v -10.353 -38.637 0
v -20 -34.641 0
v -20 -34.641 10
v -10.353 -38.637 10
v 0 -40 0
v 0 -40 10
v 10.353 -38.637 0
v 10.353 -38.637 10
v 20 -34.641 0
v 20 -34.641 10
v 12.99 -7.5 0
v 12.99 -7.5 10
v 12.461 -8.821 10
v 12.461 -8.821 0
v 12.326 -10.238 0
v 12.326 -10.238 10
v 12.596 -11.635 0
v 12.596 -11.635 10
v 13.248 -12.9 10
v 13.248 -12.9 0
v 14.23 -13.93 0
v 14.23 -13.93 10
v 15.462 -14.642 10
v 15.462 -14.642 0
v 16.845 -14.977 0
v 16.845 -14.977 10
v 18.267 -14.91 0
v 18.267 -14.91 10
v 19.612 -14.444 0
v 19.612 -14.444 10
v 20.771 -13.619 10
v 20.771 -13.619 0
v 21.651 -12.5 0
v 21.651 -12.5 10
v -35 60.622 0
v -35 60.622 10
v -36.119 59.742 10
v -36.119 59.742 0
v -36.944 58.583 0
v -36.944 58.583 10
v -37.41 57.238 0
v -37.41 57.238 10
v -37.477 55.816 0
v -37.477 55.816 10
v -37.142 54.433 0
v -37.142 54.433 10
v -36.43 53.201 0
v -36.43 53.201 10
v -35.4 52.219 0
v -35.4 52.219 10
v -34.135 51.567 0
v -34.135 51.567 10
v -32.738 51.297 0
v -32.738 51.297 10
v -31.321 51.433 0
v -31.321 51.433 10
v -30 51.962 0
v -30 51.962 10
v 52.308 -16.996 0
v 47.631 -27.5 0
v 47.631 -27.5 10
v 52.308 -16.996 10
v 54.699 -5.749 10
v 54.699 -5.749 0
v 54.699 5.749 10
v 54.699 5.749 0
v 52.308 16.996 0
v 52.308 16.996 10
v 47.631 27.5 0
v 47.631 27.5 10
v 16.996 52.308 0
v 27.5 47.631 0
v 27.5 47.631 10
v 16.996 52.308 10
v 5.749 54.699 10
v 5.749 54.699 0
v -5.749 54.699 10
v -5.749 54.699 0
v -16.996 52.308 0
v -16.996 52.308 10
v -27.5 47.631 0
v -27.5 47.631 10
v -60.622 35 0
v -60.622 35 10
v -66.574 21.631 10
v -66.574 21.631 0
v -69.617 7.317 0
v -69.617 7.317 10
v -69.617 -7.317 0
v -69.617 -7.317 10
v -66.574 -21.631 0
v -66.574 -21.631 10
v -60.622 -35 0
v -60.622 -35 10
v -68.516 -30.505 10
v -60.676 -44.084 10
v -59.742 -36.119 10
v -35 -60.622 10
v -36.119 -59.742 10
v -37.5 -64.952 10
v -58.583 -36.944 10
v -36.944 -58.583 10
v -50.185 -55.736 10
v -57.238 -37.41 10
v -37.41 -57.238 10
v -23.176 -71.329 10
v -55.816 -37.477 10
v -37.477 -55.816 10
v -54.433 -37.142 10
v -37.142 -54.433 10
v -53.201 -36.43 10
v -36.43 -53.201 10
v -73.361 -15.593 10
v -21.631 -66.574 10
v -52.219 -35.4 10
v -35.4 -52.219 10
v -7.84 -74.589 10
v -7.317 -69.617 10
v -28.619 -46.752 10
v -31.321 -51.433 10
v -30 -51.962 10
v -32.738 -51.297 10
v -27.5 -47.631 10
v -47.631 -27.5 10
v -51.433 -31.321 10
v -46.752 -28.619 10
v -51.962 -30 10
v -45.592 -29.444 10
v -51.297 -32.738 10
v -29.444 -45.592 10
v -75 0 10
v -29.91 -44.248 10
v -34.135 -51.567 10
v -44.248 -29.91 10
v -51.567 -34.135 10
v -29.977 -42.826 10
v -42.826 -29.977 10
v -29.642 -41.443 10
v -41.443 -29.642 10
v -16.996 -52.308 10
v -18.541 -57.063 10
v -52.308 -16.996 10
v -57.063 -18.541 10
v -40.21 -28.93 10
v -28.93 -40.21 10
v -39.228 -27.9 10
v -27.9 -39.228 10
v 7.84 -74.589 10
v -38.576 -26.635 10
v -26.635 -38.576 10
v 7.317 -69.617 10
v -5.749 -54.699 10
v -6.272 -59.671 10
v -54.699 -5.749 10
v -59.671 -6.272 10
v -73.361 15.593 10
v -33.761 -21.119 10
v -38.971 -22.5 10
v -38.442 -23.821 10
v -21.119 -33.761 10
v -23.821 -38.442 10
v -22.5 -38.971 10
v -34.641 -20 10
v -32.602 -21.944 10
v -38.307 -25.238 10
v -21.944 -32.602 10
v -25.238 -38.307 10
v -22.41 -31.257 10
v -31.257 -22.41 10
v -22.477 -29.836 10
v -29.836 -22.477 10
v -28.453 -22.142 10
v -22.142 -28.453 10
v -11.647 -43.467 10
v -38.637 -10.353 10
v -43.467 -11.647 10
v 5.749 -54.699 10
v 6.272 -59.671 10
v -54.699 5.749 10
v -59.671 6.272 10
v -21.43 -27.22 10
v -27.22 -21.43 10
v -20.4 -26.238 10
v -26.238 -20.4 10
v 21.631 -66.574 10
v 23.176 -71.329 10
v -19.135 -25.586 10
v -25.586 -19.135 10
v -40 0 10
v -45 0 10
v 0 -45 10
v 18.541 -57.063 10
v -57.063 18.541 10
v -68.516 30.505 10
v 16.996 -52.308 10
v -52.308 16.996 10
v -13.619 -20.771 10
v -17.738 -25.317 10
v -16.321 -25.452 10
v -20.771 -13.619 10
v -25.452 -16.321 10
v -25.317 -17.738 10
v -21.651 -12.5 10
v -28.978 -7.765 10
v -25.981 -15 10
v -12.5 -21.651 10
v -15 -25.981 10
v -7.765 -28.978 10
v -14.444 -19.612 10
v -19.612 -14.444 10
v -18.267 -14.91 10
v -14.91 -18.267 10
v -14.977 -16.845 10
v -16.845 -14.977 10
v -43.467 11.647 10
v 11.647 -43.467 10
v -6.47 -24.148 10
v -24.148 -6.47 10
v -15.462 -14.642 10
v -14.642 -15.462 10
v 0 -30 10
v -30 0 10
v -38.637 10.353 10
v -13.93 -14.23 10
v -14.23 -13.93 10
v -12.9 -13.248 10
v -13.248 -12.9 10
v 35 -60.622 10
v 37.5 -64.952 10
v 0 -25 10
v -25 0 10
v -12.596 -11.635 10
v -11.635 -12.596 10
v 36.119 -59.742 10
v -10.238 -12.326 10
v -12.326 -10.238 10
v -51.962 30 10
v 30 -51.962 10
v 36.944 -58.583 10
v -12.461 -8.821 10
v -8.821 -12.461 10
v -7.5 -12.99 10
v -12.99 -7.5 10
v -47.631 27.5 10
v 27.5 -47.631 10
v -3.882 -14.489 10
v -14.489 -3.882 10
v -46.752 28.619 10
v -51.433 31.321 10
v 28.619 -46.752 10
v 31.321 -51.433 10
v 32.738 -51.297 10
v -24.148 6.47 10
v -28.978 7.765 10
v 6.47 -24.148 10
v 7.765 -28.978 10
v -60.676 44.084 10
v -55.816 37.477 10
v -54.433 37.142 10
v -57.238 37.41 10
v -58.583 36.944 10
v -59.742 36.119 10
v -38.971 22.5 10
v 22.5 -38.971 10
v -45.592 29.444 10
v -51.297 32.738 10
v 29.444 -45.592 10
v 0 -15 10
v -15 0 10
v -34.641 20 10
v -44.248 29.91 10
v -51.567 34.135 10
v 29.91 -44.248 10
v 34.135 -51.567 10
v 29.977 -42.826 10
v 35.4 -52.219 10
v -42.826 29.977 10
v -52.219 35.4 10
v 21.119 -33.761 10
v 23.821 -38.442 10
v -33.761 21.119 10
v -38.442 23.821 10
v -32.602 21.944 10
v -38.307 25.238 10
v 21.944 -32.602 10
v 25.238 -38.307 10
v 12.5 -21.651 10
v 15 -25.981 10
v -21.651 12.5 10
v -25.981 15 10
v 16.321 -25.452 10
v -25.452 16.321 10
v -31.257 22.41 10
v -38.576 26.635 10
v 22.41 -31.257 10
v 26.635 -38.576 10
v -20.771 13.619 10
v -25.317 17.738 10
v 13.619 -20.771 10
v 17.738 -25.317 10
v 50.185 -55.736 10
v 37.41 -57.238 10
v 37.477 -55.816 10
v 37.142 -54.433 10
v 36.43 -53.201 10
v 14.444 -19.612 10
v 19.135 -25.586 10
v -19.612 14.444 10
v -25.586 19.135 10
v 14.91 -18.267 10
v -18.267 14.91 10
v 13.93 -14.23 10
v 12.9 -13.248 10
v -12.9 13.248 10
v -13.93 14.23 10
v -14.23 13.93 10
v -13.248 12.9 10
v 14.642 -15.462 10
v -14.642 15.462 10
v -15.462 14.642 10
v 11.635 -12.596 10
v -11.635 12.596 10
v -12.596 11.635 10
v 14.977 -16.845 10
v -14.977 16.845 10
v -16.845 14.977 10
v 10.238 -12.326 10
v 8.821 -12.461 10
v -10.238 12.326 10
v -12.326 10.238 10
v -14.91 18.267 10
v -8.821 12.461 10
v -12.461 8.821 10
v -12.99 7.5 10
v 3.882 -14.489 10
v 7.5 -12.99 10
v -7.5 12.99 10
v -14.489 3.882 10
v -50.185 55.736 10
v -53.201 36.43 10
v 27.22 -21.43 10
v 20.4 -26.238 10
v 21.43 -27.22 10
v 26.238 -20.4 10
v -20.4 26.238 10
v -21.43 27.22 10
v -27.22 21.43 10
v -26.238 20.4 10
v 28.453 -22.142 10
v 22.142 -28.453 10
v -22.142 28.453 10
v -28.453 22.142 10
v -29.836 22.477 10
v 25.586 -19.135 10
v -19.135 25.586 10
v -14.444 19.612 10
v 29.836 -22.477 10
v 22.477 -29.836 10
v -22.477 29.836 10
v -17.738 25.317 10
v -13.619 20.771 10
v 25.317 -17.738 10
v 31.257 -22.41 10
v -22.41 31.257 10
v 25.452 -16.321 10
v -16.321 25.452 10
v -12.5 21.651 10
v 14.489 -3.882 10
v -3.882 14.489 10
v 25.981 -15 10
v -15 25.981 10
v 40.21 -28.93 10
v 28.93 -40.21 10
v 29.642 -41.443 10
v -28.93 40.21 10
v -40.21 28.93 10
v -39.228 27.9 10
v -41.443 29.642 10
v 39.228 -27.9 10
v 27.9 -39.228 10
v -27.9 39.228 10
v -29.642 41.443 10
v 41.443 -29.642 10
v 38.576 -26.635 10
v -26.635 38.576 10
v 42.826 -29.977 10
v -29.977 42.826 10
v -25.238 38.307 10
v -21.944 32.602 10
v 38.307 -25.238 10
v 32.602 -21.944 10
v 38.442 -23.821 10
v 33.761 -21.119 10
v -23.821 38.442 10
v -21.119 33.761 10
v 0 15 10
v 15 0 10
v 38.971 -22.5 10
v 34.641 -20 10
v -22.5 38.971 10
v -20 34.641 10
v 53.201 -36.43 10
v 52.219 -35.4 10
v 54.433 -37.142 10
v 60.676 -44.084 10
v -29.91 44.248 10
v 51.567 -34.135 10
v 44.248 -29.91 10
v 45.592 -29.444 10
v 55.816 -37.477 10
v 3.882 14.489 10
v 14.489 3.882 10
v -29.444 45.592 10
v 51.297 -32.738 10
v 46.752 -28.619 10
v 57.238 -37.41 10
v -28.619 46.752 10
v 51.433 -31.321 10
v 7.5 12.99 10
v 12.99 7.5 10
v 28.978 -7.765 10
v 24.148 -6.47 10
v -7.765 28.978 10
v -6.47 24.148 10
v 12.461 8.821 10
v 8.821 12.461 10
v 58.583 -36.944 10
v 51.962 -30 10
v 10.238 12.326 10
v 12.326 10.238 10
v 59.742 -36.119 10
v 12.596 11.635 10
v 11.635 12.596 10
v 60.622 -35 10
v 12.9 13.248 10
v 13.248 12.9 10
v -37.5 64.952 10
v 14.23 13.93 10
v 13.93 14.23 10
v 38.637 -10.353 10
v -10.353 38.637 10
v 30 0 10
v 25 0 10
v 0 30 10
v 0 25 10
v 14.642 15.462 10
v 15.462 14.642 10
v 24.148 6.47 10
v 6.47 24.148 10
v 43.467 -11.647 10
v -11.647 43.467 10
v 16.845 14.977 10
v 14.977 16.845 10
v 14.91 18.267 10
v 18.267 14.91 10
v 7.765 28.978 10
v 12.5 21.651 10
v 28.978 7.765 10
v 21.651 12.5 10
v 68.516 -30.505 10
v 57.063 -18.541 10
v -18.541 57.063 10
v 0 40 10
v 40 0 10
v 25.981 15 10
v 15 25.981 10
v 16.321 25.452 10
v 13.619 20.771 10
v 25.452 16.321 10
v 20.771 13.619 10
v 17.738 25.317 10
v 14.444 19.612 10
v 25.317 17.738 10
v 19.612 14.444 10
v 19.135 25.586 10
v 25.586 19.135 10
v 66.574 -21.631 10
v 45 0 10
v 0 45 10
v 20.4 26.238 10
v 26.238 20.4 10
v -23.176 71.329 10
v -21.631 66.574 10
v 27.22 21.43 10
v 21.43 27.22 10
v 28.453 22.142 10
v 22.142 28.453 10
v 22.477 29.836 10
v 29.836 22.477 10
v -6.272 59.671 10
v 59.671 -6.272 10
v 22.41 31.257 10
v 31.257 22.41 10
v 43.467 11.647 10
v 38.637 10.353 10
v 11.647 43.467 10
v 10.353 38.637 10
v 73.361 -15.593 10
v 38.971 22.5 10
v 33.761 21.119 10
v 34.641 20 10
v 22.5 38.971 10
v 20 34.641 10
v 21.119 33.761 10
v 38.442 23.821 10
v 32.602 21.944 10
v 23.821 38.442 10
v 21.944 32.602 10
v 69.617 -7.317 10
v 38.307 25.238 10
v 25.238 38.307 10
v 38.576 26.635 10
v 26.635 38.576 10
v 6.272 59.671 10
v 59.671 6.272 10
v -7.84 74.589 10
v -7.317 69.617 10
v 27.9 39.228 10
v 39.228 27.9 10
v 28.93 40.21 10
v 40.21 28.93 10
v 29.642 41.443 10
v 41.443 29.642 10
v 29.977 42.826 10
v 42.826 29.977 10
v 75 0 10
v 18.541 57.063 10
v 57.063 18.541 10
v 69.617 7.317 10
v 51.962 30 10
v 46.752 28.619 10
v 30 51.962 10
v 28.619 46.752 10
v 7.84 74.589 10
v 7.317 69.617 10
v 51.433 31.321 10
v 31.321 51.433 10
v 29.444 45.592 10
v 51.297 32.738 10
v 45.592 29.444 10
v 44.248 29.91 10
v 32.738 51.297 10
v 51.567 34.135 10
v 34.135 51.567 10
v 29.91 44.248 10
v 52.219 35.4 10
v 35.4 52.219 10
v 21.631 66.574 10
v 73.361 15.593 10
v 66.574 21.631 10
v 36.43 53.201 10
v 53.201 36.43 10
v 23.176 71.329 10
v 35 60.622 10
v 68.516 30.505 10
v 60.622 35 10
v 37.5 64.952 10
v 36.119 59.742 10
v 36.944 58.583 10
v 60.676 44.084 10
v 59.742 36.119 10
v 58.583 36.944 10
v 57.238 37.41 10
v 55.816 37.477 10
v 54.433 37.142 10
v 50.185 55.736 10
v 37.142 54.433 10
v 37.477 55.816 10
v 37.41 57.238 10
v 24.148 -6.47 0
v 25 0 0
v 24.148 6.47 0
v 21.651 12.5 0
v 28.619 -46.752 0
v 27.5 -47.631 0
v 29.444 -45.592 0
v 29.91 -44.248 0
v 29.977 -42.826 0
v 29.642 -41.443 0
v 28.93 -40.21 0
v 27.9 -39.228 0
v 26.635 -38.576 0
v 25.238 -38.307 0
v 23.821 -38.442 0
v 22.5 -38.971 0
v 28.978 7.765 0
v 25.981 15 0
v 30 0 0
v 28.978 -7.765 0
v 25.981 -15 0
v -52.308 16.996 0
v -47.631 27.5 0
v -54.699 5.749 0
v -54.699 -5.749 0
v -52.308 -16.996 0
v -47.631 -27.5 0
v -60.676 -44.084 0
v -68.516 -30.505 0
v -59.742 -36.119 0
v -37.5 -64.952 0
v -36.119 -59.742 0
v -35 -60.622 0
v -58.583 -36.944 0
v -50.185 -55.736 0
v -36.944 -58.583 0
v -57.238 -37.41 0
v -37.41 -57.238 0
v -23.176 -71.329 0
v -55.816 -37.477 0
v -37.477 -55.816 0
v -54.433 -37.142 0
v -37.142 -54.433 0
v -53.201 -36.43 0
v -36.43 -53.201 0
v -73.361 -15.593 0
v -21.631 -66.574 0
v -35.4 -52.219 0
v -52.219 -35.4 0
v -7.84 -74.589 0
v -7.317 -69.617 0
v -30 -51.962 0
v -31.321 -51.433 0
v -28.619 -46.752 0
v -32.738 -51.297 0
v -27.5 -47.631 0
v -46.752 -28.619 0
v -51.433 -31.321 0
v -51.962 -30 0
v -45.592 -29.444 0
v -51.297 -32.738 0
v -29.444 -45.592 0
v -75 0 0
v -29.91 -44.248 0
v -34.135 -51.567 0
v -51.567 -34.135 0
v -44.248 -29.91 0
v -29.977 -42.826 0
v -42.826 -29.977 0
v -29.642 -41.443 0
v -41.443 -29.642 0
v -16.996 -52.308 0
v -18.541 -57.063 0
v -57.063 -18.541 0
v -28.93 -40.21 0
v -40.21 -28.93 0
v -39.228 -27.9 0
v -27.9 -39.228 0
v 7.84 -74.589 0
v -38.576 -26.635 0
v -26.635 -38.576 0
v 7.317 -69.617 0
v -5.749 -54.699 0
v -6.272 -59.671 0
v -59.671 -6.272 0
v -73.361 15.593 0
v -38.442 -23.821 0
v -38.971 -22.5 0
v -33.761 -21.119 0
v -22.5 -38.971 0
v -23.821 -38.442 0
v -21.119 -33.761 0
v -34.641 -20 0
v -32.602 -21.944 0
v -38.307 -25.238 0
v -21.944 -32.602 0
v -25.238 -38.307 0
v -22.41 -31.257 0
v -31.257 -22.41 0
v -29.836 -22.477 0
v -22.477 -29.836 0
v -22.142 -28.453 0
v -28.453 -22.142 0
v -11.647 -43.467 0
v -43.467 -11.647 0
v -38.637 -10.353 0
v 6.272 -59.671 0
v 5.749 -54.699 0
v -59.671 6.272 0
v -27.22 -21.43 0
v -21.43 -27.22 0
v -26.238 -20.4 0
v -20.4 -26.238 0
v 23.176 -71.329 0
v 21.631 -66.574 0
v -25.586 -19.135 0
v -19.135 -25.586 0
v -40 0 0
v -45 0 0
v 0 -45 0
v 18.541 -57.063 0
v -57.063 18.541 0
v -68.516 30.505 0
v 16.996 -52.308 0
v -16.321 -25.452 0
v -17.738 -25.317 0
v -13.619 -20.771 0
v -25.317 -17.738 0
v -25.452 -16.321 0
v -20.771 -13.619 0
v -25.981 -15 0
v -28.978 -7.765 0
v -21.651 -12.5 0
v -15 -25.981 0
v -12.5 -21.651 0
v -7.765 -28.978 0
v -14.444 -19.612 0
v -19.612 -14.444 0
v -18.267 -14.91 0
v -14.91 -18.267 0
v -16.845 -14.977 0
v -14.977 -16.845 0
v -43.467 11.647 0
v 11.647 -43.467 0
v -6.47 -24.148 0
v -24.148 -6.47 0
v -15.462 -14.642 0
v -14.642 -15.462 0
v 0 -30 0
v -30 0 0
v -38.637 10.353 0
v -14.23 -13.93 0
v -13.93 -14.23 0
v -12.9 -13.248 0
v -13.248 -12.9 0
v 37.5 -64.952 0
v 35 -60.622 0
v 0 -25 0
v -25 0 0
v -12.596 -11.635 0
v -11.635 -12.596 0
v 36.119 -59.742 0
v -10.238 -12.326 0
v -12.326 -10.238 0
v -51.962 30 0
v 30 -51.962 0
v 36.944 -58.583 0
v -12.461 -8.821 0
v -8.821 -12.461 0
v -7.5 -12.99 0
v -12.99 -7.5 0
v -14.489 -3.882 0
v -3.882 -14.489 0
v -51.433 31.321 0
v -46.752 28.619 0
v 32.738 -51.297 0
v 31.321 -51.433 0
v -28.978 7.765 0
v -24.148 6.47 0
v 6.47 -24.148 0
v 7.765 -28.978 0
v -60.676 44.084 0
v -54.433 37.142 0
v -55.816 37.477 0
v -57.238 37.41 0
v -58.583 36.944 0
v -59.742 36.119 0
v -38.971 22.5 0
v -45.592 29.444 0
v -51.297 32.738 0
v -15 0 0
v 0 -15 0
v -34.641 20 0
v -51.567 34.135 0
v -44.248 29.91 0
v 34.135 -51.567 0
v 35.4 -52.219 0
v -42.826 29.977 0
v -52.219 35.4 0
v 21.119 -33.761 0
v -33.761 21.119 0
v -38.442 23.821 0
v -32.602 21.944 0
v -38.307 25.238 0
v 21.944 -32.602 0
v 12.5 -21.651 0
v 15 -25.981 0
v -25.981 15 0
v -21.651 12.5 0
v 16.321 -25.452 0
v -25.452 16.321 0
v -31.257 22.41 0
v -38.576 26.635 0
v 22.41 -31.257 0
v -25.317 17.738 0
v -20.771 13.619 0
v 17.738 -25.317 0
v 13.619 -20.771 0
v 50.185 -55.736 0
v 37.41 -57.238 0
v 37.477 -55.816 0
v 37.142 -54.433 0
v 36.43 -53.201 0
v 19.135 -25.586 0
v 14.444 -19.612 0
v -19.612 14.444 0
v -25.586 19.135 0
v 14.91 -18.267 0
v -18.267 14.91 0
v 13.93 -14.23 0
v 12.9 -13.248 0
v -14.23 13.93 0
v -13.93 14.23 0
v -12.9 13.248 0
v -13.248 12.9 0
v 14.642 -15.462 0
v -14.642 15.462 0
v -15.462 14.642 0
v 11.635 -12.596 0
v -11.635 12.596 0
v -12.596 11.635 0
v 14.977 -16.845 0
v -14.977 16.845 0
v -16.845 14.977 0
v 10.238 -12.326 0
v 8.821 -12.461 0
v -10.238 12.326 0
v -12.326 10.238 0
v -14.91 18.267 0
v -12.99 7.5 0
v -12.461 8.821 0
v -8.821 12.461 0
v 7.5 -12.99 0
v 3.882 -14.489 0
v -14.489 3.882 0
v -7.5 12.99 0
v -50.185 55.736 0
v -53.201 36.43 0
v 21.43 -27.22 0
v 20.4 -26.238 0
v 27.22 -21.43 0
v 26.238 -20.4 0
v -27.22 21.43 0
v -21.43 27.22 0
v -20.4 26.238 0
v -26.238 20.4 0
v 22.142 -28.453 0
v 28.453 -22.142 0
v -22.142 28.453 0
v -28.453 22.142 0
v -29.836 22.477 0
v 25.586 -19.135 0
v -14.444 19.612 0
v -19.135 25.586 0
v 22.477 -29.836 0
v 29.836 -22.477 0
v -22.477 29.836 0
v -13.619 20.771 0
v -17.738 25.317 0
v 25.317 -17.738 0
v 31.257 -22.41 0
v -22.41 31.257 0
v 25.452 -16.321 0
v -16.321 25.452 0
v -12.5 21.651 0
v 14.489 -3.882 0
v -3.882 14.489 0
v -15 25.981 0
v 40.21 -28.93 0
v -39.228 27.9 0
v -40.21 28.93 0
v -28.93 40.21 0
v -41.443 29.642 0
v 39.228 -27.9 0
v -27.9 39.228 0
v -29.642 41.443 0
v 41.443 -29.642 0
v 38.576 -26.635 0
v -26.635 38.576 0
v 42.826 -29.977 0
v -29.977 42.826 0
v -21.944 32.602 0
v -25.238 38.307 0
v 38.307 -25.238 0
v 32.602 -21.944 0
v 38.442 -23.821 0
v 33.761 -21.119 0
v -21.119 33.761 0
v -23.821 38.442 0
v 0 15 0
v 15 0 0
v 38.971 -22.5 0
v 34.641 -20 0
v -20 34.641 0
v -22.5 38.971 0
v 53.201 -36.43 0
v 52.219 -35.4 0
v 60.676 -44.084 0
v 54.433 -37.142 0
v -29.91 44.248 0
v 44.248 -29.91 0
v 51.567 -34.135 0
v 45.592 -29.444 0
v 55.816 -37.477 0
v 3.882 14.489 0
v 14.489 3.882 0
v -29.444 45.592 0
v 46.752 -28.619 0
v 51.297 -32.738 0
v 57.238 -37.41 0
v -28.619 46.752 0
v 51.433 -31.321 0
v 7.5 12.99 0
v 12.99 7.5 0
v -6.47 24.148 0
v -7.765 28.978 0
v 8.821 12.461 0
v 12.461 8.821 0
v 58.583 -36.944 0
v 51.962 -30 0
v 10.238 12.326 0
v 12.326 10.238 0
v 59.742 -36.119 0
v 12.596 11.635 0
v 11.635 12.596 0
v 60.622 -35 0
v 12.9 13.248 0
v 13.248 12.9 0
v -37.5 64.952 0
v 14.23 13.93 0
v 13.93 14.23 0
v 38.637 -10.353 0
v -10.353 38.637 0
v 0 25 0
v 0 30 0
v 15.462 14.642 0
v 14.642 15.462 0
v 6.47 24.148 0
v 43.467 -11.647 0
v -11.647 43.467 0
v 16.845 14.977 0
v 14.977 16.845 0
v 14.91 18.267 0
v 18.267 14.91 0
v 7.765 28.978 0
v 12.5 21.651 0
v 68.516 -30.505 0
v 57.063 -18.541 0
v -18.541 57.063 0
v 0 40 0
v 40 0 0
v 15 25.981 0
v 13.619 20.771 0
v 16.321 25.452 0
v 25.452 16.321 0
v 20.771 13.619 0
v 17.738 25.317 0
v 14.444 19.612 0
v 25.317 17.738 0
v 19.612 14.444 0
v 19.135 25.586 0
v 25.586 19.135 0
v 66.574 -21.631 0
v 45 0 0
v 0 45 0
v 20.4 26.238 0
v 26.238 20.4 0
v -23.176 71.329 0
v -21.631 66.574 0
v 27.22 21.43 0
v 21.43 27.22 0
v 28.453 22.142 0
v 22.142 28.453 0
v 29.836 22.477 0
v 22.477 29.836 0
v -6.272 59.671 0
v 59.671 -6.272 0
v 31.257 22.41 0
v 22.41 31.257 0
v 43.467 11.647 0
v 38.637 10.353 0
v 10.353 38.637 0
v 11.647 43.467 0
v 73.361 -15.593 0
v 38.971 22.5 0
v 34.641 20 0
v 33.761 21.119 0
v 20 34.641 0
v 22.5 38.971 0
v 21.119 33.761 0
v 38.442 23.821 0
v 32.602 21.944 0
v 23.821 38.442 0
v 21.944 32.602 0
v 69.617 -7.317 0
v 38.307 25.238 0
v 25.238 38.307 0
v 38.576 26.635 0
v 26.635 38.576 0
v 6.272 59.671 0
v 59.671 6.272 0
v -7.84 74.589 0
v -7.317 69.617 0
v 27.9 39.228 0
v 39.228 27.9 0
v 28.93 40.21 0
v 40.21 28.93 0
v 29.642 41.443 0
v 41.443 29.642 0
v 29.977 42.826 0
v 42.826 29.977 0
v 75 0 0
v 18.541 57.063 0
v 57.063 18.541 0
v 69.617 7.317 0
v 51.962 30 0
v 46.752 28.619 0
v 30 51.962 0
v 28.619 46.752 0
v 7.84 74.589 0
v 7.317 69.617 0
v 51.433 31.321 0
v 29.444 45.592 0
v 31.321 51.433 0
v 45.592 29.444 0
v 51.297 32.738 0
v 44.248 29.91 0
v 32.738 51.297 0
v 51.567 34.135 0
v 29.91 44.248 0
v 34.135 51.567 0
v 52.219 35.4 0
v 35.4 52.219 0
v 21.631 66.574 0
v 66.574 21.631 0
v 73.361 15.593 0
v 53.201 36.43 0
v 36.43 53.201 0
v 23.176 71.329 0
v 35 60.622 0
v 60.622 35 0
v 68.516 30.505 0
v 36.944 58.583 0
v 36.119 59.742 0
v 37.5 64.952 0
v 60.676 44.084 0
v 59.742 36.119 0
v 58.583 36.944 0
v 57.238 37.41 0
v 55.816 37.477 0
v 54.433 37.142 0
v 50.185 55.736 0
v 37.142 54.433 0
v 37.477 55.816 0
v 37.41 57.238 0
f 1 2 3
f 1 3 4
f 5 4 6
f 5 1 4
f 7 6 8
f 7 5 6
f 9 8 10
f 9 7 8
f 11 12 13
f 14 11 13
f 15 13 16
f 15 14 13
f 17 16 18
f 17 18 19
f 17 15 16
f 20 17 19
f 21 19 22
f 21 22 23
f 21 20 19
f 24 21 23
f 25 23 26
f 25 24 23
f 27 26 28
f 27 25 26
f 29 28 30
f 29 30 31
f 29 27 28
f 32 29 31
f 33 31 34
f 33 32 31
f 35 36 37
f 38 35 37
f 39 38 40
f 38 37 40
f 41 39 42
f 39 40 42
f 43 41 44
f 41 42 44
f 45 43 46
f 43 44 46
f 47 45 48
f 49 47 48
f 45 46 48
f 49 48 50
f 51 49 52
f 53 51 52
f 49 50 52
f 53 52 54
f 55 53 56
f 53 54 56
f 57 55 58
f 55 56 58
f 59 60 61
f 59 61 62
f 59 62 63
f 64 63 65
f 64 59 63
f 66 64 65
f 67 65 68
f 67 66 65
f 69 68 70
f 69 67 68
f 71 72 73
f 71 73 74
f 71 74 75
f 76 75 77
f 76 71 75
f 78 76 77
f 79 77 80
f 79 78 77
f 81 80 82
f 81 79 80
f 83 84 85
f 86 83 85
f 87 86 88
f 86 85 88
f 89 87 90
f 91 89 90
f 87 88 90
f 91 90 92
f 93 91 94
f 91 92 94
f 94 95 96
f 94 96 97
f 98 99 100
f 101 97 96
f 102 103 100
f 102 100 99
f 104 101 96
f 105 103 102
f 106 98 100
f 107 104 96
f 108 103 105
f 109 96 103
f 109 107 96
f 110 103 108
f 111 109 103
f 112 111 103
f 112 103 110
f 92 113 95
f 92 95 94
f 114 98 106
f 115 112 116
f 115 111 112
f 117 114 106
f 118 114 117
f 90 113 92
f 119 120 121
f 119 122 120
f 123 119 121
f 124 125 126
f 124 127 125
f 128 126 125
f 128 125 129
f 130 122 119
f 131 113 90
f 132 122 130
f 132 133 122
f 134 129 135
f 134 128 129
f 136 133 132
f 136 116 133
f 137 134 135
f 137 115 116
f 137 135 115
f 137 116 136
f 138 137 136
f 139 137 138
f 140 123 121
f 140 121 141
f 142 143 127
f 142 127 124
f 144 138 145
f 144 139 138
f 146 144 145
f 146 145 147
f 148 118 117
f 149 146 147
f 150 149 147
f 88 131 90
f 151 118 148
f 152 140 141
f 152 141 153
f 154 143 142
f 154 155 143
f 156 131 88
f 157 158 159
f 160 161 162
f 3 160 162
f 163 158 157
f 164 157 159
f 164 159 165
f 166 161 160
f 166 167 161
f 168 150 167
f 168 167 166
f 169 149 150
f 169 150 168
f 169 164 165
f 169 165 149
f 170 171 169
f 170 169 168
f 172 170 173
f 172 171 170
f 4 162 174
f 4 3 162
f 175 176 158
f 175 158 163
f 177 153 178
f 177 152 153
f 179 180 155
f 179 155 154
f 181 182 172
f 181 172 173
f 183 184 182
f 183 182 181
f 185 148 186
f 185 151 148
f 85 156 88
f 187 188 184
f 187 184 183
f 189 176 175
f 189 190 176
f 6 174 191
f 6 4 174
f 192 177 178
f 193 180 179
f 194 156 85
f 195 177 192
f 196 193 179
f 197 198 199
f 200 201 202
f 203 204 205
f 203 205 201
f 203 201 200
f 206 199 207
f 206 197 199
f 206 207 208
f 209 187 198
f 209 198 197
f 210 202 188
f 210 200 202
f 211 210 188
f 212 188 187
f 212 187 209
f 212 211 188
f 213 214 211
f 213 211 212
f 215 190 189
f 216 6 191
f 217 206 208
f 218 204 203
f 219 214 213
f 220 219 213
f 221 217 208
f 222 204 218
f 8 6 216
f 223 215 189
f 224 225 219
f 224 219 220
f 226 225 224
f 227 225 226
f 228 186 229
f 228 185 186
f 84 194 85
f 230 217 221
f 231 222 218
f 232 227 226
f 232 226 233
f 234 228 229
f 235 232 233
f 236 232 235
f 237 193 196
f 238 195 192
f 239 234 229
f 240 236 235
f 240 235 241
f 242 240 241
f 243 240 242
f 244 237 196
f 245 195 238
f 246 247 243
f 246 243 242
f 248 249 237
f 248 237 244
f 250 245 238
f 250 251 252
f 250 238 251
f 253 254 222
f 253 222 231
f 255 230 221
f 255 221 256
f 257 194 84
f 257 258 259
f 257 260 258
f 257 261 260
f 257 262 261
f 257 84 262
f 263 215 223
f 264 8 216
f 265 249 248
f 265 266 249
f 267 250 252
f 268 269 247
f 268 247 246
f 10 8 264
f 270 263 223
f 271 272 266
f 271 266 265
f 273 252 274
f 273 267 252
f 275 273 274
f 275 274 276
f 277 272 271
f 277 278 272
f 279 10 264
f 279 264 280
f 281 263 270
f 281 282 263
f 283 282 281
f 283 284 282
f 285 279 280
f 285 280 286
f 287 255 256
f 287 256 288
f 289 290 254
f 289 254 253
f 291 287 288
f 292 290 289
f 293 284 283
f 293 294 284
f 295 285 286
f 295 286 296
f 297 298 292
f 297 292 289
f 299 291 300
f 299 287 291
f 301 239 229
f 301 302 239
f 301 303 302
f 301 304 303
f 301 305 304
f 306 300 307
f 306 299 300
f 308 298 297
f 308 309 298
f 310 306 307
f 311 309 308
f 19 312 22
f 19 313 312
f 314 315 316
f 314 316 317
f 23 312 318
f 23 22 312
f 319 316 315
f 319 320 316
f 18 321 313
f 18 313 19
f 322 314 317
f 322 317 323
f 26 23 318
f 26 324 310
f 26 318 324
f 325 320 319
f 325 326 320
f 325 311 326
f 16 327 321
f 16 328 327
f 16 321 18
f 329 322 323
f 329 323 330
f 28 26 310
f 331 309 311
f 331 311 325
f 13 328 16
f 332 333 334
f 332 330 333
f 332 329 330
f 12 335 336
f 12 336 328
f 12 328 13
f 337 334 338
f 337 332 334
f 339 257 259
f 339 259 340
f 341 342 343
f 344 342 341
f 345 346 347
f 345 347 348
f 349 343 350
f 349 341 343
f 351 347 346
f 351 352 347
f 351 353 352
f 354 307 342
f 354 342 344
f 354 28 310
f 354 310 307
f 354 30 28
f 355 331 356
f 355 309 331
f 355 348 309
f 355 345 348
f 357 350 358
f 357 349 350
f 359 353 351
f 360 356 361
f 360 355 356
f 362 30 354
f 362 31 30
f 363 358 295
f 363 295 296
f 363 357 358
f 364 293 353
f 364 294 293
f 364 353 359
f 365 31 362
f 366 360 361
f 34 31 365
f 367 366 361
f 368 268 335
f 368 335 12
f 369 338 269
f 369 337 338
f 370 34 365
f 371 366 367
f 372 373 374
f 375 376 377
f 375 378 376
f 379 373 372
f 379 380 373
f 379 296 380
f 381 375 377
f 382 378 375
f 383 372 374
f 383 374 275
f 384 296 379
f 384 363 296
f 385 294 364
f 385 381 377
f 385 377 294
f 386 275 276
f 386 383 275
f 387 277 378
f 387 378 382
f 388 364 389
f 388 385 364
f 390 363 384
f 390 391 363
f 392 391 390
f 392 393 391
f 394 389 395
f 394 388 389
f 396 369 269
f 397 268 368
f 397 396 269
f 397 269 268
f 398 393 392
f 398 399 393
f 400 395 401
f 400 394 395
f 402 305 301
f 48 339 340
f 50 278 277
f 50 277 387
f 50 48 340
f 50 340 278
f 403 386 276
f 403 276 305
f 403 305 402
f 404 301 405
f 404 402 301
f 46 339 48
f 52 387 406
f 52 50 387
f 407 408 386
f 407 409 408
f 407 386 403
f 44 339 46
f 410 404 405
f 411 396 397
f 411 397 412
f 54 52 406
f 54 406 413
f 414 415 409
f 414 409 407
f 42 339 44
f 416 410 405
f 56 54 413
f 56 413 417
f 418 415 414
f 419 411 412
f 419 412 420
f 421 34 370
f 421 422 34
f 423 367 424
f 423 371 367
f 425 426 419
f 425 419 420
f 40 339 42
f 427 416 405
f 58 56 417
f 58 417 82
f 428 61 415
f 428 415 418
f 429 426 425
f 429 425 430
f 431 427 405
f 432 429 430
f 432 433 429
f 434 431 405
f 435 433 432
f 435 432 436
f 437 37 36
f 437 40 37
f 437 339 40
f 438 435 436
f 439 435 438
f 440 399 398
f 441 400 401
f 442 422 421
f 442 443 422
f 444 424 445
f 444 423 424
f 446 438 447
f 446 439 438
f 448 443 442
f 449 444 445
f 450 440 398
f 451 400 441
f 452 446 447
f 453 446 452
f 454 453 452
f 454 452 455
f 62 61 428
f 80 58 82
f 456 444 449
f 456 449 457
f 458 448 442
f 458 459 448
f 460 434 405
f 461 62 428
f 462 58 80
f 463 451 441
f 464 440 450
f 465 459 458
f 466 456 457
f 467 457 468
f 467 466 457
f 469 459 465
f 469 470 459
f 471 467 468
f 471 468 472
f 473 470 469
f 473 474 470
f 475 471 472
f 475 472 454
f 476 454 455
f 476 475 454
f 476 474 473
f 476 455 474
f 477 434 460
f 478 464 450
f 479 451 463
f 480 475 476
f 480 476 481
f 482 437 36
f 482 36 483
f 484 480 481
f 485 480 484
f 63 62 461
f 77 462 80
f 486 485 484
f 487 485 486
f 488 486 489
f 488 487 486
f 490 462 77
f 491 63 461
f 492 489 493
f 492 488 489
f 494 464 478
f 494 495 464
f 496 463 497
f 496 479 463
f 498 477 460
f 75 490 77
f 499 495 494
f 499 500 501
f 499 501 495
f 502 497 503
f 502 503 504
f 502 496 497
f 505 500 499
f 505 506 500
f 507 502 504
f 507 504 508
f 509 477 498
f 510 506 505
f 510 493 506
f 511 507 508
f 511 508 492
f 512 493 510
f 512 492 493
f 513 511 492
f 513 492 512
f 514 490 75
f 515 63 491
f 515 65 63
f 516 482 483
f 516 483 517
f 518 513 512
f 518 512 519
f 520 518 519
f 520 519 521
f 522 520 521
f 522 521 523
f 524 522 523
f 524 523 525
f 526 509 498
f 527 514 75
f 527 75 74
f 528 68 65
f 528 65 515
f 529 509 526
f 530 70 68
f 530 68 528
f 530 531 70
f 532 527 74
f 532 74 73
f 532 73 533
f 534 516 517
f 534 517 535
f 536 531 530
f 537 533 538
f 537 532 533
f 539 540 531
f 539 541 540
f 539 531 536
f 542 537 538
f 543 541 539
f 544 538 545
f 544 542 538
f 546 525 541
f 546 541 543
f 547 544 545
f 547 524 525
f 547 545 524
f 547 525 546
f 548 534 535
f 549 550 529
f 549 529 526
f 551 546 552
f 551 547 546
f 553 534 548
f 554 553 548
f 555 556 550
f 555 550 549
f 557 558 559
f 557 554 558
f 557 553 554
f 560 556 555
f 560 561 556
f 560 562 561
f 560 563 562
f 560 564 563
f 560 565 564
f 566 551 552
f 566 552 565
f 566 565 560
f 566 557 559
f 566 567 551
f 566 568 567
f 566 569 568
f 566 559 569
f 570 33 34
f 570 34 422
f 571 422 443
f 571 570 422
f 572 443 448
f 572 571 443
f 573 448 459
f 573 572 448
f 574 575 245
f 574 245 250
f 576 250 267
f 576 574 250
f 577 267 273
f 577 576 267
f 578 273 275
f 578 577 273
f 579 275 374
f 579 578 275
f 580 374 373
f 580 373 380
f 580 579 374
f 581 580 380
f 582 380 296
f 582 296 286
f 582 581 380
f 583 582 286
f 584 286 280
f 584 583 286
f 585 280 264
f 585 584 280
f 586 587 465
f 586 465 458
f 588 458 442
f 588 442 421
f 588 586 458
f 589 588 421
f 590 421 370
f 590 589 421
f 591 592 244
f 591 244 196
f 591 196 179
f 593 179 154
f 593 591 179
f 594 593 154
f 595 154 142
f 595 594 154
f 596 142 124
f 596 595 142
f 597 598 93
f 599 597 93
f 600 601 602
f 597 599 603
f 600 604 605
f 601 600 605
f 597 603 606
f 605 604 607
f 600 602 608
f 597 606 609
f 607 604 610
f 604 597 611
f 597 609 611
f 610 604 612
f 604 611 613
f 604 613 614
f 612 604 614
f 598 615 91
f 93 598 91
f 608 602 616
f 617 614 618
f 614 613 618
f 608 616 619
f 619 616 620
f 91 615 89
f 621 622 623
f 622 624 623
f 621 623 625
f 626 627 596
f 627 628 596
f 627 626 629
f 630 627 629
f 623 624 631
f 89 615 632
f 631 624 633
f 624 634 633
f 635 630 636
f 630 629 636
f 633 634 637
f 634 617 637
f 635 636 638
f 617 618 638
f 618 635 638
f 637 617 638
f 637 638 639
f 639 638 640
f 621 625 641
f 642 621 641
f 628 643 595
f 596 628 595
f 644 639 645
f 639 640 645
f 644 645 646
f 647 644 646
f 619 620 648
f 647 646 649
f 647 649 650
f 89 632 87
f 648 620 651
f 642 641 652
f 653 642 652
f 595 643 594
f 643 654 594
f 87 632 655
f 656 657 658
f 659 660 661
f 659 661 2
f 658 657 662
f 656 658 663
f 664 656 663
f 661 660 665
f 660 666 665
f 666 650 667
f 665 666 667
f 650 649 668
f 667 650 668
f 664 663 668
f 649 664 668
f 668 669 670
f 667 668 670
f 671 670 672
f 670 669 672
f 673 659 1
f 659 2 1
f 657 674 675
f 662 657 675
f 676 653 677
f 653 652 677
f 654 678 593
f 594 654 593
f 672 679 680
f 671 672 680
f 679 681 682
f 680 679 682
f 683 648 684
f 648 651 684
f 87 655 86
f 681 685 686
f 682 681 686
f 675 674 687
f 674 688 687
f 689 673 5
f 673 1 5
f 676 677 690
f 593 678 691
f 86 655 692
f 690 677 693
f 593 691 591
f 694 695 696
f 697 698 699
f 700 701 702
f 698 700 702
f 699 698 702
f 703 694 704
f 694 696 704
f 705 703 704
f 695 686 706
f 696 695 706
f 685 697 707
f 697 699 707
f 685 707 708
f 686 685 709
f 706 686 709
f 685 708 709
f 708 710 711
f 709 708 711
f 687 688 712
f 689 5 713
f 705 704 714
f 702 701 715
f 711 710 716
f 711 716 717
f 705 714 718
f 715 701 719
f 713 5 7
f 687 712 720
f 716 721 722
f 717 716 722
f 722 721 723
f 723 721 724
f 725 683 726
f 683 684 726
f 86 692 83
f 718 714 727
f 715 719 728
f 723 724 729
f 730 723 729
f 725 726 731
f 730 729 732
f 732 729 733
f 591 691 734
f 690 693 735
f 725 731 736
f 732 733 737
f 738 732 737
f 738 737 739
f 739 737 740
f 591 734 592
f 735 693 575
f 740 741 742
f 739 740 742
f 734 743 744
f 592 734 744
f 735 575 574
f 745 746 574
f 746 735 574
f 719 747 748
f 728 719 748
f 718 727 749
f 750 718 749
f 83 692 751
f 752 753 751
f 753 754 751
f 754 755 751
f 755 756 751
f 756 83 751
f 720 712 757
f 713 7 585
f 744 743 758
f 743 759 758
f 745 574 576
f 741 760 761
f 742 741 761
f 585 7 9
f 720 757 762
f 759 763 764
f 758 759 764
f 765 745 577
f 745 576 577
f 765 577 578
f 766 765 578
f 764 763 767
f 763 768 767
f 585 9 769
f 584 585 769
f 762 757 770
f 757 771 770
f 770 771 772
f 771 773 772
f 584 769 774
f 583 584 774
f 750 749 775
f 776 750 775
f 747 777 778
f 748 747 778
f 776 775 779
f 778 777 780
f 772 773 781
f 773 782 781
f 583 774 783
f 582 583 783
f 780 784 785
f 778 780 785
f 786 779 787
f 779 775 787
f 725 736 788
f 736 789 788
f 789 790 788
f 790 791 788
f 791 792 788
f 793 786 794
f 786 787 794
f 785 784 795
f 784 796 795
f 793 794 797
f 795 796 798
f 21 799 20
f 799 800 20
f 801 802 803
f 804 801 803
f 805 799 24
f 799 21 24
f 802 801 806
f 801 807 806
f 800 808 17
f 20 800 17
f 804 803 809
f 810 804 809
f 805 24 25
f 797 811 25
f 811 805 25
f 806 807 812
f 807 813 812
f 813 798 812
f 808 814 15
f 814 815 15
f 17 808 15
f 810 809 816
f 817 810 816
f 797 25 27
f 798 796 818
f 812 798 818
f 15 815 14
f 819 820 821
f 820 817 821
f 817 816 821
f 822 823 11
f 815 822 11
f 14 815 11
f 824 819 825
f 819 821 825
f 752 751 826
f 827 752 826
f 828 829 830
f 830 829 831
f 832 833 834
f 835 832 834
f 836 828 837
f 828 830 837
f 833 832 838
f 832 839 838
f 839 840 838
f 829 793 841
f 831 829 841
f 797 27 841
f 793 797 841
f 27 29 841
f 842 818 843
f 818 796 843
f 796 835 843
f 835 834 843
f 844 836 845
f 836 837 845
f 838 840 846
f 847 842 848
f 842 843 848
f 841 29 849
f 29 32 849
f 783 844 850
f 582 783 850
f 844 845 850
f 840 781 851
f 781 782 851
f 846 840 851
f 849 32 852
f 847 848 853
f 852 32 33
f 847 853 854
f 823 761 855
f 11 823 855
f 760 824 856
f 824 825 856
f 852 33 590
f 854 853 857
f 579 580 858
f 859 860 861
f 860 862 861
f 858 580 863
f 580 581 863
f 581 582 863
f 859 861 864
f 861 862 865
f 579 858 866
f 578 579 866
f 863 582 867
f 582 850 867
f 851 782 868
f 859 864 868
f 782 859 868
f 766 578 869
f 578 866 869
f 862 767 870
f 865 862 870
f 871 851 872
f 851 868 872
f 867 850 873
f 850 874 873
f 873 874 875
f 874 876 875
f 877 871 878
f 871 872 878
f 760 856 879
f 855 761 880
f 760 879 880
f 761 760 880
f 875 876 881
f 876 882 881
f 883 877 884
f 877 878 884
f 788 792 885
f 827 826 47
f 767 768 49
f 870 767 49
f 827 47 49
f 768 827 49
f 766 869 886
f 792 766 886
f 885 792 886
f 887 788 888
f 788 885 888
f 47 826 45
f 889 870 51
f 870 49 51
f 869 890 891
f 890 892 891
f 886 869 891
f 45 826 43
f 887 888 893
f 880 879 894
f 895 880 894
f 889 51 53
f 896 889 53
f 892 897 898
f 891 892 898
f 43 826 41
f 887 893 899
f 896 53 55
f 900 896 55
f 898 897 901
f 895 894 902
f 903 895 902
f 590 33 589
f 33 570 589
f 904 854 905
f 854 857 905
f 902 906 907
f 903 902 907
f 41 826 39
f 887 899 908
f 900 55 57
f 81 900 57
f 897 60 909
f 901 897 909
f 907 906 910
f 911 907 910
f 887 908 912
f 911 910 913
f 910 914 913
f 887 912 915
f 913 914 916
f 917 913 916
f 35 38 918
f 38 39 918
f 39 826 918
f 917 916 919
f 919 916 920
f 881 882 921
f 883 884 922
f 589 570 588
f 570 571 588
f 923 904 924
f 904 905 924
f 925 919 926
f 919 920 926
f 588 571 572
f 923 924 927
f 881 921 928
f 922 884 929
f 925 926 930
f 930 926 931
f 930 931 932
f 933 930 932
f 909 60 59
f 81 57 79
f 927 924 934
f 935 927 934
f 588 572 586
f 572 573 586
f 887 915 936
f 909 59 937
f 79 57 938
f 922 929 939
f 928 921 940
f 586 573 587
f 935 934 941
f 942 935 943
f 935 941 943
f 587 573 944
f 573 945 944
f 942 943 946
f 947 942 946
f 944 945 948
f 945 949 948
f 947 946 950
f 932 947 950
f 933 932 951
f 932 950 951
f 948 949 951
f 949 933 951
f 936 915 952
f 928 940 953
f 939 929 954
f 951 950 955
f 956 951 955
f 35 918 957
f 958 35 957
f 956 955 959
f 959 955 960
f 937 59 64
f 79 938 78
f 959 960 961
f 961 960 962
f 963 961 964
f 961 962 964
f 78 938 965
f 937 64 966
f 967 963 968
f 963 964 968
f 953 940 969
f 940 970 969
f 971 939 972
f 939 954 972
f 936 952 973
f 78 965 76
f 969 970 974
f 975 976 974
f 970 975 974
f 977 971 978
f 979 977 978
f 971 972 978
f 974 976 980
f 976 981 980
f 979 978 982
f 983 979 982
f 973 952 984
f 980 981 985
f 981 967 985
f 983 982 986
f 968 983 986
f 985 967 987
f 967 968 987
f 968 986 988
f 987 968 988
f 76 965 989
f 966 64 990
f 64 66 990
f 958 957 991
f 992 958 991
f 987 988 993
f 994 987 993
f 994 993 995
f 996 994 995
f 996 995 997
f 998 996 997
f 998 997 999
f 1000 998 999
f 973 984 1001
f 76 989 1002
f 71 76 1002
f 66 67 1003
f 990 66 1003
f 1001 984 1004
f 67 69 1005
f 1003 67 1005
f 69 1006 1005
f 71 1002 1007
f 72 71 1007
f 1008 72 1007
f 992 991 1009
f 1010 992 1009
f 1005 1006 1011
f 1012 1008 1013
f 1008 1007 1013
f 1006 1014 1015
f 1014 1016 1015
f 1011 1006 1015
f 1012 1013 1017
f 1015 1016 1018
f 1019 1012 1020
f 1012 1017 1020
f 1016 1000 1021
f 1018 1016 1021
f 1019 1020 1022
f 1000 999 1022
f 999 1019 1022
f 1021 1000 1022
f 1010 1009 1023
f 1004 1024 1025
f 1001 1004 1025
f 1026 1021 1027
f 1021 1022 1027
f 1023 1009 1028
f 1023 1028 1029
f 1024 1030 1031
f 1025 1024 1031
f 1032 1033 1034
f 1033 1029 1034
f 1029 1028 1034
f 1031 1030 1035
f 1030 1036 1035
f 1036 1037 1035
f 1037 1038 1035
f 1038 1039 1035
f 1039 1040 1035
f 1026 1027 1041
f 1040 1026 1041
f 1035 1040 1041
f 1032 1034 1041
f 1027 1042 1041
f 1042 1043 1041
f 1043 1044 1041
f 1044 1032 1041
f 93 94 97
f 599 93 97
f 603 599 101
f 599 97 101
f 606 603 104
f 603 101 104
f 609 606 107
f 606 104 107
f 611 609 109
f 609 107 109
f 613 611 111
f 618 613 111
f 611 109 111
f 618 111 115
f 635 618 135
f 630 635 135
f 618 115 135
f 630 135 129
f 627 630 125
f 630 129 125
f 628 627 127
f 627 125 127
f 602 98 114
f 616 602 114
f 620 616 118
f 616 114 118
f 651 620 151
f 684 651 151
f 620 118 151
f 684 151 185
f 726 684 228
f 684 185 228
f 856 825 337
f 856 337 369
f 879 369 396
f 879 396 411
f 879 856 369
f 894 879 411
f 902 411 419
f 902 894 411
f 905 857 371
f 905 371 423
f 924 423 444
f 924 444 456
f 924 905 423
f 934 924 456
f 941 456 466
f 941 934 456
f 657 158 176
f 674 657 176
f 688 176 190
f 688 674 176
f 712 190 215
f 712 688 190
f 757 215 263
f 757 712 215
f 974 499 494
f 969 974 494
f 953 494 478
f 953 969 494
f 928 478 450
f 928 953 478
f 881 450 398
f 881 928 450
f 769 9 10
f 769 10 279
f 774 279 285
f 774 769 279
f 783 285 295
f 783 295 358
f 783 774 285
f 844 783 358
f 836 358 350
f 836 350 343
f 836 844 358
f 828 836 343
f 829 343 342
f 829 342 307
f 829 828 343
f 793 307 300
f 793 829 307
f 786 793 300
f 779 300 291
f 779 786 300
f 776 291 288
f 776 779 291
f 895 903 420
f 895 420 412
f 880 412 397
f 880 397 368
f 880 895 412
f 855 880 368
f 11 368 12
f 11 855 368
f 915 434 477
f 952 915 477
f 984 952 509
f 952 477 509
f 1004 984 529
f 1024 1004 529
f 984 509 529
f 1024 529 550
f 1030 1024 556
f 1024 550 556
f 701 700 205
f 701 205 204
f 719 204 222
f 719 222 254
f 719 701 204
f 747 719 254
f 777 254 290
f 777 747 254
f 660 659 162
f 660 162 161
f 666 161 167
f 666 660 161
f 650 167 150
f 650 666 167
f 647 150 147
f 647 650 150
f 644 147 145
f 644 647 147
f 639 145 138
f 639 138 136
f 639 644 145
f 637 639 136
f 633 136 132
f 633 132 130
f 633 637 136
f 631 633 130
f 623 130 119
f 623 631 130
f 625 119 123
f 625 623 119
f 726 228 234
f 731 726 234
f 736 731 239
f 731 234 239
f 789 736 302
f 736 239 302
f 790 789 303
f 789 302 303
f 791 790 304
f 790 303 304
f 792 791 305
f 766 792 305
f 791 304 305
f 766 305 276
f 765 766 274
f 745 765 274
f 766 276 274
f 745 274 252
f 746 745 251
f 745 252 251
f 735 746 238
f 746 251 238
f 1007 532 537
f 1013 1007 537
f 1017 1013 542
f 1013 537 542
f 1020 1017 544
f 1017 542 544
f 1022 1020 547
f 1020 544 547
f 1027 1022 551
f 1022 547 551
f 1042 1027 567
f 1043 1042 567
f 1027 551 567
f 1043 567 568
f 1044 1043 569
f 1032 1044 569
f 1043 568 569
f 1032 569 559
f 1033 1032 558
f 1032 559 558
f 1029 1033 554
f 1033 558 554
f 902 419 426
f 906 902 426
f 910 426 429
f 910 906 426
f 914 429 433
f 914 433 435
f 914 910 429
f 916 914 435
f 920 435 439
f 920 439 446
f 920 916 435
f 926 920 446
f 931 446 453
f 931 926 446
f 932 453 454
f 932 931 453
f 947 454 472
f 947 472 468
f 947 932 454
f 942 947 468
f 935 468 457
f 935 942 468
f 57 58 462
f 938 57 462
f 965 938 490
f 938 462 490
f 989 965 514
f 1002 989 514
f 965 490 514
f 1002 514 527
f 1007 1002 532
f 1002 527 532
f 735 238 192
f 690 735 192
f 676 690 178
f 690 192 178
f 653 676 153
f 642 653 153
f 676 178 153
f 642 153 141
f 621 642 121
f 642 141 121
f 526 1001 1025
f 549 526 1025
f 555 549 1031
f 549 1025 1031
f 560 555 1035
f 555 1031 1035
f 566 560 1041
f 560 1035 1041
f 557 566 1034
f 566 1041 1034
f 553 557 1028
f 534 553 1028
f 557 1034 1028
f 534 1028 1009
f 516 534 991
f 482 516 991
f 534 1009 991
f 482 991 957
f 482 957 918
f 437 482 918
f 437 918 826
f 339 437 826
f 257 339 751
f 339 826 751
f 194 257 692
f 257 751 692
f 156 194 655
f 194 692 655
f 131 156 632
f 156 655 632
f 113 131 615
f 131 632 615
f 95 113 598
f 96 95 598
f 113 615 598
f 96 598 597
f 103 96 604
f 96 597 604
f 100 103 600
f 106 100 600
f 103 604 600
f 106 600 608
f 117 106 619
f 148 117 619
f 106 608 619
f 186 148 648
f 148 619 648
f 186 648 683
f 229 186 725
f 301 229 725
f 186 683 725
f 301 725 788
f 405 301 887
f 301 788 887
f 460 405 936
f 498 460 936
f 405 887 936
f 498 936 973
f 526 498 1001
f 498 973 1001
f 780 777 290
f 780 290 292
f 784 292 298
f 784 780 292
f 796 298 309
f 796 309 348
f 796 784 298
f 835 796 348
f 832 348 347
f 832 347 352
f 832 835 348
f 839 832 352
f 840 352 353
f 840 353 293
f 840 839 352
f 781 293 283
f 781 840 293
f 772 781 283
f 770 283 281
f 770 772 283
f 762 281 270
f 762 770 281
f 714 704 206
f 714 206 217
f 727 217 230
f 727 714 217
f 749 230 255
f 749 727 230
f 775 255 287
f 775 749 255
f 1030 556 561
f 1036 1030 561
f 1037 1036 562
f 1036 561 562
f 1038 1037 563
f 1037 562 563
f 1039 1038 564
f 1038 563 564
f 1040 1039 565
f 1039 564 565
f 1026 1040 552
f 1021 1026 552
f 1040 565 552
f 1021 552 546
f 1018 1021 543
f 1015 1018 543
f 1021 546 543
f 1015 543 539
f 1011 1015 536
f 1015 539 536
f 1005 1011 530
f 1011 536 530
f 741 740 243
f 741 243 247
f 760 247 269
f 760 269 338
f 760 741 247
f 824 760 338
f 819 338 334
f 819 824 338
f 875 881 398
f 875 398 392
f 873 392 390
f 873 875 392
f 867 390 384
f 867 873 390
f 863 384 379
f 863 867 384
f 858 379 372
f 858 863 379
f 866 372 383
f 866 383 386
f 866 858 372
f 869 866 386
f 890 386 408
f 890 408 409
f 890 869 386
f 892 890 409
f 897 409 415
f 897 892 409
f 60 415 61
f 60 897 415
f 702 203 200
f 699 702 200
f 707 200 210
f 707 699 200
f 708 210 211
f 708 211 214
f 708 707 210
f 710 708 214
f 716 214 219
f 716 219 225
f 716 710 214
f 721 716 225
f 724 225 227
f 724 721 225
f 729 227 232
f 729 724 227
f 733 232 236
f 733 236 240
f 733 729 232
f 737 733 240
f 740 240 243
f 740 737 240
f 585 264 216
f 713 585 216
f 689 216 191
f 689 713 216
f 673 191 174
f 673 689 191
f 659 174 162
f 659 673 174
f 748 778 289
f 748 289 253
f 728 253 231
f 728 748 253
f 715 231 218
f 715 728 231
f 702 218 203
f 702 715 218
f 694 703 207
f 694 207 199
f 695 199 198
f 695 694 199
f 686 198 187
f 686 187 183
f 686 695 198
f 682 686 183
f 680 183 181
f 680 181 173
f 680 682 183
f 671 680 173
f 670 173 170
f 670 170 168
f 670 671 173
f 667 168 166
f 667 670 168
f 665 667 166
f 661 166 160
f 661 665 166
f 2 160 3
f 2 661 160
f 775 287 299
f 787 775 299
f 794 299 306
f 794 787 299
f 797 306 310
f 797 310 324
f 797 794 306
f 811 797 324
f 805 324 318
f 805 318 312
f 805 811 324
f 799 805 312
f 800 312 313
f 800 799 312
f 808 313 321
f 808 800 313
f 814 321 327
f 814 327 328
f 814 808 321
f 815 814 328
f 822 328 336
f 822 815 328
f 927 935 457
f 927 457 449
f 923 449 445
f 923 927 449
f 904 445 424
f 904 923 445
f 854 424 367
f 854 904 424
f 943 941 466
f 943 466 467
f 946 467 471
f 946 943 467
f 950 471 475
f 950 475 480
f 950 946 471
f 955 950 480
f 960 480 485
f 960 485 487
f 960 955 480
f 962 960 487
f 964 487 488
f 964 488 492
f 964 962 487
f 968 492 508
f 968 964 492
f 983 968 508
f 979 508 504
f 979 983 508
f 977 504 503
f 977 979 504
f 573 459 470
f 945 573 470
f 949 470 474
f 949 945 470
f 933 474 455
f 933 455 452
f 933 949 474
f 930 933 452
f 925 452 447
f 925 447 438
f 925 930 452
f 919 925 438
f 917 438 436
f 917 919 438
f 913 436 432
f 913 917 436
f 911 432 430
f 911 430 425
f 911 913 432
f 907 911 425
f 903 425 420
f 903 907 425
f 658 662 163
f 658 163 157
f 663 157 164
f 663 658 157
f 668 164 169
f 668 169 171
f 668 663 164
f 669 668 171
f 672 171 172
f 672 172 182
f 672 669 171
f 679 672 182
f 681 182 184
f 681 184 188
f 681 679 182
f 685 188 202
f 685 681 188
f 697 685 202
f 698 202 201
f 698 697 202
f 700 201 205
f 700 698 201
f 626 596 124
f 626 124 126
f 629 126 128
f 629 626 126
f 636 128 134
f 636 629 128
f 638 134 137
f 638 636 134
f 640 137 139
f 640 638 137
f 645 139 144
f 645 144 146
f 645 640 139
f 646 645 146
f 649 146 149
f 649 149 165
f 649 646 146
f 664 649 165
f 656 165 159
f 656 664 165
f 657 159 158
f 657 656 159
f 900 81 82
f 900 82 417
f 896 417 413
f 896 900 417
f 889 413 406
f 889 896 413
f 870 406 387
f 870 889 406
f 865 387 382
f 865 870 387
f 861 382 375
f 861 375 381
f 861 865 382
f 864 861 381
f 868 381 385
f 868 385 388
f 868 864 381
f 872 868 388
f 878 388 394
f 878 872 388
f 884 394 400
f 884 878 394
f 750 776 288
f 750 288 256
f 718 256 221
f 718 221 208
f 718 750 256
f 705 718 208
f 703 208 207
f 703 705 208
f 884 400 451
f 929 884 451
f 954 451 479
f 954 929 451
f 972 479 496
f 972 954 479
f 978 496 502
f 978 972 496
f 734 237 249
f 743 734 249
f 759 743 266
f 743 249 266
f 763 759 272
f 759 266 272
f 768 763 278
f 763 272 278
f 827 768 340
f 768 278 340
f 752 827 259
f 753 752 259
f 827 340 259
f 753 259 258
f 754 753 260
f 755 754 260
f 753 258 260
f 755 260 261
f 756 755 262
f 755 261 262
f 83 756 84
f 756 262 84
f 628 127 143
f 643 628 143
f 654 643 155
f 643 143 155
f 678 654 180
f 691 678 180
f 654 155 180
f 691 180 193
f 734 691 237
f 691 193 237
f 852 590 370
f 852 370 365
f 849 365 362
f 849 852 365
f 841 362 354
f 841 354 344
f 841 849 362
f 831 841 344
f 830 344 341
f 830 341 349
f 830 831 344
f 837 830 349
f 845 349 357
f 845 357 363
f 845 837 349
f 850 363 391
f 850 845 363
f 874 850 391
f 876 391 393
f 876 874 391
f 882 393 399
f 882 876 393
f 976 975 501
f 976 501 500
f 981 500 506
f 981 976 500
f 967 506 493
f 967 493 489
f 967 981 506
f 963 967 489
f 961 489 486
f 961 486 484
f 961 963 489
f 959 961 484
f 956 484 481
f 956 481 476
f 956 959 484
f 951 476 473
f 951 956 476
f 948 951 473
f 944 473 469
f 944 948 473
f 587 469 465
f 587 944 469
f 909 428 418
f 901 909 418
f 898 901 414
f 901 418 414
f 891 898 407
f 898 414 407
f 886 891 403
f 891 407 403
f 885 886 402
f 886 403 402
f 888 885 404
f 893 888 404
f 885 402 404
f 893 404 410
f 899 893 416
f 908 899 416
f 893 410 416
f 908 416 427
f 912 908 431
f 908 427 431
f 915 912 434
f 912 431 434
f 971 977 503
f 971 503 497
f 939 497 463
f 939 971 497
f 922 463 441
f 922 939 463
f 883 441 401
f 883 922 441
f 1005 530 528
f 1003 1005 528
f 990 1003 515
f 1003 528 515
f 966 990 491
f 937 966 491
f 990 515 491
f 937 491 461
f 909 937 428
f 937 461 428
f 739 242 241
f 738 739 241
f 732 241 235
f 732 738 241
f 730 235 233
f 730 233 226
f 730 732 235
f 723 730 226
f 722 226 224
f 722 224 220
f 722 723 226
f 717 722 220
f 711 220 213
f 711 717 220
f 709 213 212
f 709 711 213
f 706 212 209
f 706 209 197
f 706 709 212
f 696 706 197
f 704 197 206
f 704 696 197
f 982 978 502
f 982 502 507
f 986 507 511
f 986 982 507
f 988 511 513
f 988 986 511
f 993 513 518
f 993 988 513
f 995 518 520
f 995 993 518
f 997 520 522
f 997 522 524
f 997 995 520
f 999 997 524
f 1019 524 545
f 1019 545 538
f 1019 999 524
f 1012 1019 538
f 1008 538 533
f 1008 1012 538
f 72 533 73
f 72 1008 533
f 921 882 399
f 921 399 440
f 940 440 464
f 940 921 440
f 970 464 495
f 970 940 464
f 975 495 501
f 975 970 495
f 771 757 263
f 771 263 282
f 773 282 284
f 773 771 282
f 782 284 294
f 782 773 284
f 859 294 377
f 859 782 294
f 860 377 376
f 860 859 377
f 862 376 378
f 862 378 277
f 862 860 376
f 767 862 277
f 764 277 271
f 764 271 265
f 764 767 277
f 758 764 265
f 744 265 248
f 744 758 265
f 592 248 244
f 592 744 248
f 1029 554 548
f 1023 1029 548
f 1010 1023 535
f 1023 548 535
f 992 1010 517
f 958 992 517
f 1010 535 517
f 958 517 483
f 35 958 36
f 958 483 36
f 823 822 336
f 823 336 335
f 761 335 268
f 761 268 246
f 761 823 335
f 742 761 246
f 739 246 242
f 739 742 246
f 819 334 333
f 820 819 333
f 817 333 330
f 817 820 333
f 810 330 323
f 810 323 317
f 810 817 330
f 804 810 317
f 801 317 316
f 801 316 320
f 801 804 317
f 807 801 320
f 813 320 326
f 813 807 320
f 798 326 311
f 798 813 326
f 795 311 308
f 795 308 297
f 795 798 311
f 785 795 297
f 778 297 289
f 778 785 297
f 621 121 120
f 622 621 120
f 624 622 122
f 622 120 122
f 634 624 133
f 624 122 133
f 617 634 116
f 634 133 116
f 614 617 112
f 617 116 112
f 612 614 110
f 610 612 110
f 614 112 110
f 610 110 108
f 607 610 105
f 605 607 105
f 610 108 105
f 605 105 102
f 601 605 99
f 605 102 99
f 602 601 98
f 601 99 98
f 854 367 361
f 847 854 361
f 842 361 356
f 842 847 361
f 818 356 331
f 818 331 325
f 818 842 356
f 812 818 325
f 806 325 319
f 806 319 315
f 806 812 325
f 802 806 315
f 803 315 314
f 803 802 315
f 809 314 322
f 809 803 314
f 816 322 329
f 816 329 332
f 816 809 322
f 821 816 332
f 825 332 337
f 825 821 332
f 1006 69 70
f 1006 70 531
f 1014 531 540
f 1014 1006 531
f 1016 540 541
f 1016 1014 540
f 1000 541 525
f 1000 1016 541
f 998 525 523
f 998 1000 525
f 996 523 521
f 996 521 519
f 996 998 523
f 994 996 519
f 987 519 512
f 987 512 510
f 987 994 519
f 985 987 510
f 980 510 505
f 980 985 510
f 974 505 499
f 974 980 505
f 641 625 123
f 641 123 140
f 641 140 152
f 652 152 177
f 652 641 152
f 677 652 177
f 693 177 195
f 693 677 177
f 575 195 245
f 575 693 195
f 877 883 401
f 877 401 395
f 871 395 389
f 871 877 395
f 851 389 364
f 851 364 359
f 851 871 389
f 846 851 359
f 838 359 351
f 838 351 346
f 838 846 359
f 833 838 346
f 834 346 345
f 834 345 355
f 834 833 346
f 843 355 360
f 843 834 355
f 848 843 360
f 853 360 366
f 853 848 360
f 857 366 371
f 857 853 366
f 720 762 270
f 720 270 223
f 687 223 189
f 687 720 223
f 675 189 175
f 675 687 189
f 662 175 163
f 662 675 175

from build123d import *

# Parameters (mm, degrees)
SKETCH1_R           = 75
BOSS_EXTRUDE1_DEPTH = 10
CUT_EXTRUDE1_DEPTH  = 10
LPATTERN1_DEPTH     = 10
CIRPATTERN1_COUNT   = 4


# Read off the part's stored shape, not the designer's step: LPattern1
with BuildPart() as part:
    # Sketch1 → Boss-Extrude1 (new body)
    with BuildSketch(Plane.XY):
        Circle(SKETCH1_R)
    extrude(amount=BOSS_EXTRUDE1_DEPTH)

    # Sketch2 → Cut-Extrude1 (cut)
    with BuildSketch(Plane.XY.offset(10)):
        with BuildLine():
            ThreePointArc((35, 60.621778265), (0, 70), (-35, 60.621778265))
            ThreePointArc((-35, 60.621778265), (-36.830127019, 53.791651246), (-30, 51.961524227))
            ThreePointArc((-30, 51.961524227), (0, 60), (30, 51.961524227))
            ThreePointArc((30, 51.961524227), (36.830127019, 53.791651246), (35, 60.621778265))
        make_face()
    cut_extrude1 = extrude(amount=-CUT_EXTRUDE1_DEPTH, mode=Mode.SUBTRACT)

    # LPattern1 outline → LPattern1 (cut)
    with BuildSketch(Plane.XY):
        with BuildLine():
            ThreePointArc((-22.5, 38.97114317), (0, 45), (22.5, 38.97114317))
            ThreePointArc((22.5, 38.97114317), (29.330127019, 40.801270189), (27.5, 47.631397208))
            ThreePointArc((27.5, 47.631397208), (0, 55), (-27.5, 47.631397208))
            ThreePointArc((-27.5, 47.631397208), (-29.330127019, 40.801270189), (-22.5, 38.97114317))
        make_face()
        with BuildLine():
            ThreePointArc((-7.5, 12.990381057), (0, 15), (7.5, 12.990381057))
            ThreePointArc((7.5, 12.990381057), (14.330127019, 14.820508076), (12.5, 21.650635095))
            ThreePointArc((12.5, 21.650635095), (0, 25), (-12.5, 21.650635095))
            ThreePointArc((-12.5, 21.650635095), (-14.330127019, 14.820508076), (-7.5, 12.990381057))
        make_face()
        with BuildLine():
            ThreePointArc((-15, 25.980762114), (0, 30), (15, 25.980762114))
            ThreePointArc((15, 25.980762114), (21.830127019, 27.810889132), (20, 34.641016151))
            ThreePointArc((20, 34.641016151), (0, 40), (-20, 34.641016151))
            ThreePointArc((-20, 34.641016151), (-21.830127019, 27.810889132), (-15, 25.980762114))
        make_face()
    lpattern1 = extrude(amount=LPATTERN1_DEPTH, mode=Mode.SUBTRACT)

    # CirPattern1: Cut-Extrude1, LPattern1 ×4 about axis
    cirpattern1_axis = Axis((0, 0, 0), (0, 0, 1))
    add([cut_extrude1.rotate(cirpattern1_axis, i * 360 / CIRPATTERN1_COUNT) for i in range(1, CIRPATTERN1_COUNT)], mode=Mode.SUBTRACT)
    add([lpattern1.rotate(cirpattern1_axis, i * 360 / CIRPATTERN1_COUNT) for i in range(1, CIRPATTERN1_COUNT)], mode=Mode.SUBTRACT)


solid = part.part
